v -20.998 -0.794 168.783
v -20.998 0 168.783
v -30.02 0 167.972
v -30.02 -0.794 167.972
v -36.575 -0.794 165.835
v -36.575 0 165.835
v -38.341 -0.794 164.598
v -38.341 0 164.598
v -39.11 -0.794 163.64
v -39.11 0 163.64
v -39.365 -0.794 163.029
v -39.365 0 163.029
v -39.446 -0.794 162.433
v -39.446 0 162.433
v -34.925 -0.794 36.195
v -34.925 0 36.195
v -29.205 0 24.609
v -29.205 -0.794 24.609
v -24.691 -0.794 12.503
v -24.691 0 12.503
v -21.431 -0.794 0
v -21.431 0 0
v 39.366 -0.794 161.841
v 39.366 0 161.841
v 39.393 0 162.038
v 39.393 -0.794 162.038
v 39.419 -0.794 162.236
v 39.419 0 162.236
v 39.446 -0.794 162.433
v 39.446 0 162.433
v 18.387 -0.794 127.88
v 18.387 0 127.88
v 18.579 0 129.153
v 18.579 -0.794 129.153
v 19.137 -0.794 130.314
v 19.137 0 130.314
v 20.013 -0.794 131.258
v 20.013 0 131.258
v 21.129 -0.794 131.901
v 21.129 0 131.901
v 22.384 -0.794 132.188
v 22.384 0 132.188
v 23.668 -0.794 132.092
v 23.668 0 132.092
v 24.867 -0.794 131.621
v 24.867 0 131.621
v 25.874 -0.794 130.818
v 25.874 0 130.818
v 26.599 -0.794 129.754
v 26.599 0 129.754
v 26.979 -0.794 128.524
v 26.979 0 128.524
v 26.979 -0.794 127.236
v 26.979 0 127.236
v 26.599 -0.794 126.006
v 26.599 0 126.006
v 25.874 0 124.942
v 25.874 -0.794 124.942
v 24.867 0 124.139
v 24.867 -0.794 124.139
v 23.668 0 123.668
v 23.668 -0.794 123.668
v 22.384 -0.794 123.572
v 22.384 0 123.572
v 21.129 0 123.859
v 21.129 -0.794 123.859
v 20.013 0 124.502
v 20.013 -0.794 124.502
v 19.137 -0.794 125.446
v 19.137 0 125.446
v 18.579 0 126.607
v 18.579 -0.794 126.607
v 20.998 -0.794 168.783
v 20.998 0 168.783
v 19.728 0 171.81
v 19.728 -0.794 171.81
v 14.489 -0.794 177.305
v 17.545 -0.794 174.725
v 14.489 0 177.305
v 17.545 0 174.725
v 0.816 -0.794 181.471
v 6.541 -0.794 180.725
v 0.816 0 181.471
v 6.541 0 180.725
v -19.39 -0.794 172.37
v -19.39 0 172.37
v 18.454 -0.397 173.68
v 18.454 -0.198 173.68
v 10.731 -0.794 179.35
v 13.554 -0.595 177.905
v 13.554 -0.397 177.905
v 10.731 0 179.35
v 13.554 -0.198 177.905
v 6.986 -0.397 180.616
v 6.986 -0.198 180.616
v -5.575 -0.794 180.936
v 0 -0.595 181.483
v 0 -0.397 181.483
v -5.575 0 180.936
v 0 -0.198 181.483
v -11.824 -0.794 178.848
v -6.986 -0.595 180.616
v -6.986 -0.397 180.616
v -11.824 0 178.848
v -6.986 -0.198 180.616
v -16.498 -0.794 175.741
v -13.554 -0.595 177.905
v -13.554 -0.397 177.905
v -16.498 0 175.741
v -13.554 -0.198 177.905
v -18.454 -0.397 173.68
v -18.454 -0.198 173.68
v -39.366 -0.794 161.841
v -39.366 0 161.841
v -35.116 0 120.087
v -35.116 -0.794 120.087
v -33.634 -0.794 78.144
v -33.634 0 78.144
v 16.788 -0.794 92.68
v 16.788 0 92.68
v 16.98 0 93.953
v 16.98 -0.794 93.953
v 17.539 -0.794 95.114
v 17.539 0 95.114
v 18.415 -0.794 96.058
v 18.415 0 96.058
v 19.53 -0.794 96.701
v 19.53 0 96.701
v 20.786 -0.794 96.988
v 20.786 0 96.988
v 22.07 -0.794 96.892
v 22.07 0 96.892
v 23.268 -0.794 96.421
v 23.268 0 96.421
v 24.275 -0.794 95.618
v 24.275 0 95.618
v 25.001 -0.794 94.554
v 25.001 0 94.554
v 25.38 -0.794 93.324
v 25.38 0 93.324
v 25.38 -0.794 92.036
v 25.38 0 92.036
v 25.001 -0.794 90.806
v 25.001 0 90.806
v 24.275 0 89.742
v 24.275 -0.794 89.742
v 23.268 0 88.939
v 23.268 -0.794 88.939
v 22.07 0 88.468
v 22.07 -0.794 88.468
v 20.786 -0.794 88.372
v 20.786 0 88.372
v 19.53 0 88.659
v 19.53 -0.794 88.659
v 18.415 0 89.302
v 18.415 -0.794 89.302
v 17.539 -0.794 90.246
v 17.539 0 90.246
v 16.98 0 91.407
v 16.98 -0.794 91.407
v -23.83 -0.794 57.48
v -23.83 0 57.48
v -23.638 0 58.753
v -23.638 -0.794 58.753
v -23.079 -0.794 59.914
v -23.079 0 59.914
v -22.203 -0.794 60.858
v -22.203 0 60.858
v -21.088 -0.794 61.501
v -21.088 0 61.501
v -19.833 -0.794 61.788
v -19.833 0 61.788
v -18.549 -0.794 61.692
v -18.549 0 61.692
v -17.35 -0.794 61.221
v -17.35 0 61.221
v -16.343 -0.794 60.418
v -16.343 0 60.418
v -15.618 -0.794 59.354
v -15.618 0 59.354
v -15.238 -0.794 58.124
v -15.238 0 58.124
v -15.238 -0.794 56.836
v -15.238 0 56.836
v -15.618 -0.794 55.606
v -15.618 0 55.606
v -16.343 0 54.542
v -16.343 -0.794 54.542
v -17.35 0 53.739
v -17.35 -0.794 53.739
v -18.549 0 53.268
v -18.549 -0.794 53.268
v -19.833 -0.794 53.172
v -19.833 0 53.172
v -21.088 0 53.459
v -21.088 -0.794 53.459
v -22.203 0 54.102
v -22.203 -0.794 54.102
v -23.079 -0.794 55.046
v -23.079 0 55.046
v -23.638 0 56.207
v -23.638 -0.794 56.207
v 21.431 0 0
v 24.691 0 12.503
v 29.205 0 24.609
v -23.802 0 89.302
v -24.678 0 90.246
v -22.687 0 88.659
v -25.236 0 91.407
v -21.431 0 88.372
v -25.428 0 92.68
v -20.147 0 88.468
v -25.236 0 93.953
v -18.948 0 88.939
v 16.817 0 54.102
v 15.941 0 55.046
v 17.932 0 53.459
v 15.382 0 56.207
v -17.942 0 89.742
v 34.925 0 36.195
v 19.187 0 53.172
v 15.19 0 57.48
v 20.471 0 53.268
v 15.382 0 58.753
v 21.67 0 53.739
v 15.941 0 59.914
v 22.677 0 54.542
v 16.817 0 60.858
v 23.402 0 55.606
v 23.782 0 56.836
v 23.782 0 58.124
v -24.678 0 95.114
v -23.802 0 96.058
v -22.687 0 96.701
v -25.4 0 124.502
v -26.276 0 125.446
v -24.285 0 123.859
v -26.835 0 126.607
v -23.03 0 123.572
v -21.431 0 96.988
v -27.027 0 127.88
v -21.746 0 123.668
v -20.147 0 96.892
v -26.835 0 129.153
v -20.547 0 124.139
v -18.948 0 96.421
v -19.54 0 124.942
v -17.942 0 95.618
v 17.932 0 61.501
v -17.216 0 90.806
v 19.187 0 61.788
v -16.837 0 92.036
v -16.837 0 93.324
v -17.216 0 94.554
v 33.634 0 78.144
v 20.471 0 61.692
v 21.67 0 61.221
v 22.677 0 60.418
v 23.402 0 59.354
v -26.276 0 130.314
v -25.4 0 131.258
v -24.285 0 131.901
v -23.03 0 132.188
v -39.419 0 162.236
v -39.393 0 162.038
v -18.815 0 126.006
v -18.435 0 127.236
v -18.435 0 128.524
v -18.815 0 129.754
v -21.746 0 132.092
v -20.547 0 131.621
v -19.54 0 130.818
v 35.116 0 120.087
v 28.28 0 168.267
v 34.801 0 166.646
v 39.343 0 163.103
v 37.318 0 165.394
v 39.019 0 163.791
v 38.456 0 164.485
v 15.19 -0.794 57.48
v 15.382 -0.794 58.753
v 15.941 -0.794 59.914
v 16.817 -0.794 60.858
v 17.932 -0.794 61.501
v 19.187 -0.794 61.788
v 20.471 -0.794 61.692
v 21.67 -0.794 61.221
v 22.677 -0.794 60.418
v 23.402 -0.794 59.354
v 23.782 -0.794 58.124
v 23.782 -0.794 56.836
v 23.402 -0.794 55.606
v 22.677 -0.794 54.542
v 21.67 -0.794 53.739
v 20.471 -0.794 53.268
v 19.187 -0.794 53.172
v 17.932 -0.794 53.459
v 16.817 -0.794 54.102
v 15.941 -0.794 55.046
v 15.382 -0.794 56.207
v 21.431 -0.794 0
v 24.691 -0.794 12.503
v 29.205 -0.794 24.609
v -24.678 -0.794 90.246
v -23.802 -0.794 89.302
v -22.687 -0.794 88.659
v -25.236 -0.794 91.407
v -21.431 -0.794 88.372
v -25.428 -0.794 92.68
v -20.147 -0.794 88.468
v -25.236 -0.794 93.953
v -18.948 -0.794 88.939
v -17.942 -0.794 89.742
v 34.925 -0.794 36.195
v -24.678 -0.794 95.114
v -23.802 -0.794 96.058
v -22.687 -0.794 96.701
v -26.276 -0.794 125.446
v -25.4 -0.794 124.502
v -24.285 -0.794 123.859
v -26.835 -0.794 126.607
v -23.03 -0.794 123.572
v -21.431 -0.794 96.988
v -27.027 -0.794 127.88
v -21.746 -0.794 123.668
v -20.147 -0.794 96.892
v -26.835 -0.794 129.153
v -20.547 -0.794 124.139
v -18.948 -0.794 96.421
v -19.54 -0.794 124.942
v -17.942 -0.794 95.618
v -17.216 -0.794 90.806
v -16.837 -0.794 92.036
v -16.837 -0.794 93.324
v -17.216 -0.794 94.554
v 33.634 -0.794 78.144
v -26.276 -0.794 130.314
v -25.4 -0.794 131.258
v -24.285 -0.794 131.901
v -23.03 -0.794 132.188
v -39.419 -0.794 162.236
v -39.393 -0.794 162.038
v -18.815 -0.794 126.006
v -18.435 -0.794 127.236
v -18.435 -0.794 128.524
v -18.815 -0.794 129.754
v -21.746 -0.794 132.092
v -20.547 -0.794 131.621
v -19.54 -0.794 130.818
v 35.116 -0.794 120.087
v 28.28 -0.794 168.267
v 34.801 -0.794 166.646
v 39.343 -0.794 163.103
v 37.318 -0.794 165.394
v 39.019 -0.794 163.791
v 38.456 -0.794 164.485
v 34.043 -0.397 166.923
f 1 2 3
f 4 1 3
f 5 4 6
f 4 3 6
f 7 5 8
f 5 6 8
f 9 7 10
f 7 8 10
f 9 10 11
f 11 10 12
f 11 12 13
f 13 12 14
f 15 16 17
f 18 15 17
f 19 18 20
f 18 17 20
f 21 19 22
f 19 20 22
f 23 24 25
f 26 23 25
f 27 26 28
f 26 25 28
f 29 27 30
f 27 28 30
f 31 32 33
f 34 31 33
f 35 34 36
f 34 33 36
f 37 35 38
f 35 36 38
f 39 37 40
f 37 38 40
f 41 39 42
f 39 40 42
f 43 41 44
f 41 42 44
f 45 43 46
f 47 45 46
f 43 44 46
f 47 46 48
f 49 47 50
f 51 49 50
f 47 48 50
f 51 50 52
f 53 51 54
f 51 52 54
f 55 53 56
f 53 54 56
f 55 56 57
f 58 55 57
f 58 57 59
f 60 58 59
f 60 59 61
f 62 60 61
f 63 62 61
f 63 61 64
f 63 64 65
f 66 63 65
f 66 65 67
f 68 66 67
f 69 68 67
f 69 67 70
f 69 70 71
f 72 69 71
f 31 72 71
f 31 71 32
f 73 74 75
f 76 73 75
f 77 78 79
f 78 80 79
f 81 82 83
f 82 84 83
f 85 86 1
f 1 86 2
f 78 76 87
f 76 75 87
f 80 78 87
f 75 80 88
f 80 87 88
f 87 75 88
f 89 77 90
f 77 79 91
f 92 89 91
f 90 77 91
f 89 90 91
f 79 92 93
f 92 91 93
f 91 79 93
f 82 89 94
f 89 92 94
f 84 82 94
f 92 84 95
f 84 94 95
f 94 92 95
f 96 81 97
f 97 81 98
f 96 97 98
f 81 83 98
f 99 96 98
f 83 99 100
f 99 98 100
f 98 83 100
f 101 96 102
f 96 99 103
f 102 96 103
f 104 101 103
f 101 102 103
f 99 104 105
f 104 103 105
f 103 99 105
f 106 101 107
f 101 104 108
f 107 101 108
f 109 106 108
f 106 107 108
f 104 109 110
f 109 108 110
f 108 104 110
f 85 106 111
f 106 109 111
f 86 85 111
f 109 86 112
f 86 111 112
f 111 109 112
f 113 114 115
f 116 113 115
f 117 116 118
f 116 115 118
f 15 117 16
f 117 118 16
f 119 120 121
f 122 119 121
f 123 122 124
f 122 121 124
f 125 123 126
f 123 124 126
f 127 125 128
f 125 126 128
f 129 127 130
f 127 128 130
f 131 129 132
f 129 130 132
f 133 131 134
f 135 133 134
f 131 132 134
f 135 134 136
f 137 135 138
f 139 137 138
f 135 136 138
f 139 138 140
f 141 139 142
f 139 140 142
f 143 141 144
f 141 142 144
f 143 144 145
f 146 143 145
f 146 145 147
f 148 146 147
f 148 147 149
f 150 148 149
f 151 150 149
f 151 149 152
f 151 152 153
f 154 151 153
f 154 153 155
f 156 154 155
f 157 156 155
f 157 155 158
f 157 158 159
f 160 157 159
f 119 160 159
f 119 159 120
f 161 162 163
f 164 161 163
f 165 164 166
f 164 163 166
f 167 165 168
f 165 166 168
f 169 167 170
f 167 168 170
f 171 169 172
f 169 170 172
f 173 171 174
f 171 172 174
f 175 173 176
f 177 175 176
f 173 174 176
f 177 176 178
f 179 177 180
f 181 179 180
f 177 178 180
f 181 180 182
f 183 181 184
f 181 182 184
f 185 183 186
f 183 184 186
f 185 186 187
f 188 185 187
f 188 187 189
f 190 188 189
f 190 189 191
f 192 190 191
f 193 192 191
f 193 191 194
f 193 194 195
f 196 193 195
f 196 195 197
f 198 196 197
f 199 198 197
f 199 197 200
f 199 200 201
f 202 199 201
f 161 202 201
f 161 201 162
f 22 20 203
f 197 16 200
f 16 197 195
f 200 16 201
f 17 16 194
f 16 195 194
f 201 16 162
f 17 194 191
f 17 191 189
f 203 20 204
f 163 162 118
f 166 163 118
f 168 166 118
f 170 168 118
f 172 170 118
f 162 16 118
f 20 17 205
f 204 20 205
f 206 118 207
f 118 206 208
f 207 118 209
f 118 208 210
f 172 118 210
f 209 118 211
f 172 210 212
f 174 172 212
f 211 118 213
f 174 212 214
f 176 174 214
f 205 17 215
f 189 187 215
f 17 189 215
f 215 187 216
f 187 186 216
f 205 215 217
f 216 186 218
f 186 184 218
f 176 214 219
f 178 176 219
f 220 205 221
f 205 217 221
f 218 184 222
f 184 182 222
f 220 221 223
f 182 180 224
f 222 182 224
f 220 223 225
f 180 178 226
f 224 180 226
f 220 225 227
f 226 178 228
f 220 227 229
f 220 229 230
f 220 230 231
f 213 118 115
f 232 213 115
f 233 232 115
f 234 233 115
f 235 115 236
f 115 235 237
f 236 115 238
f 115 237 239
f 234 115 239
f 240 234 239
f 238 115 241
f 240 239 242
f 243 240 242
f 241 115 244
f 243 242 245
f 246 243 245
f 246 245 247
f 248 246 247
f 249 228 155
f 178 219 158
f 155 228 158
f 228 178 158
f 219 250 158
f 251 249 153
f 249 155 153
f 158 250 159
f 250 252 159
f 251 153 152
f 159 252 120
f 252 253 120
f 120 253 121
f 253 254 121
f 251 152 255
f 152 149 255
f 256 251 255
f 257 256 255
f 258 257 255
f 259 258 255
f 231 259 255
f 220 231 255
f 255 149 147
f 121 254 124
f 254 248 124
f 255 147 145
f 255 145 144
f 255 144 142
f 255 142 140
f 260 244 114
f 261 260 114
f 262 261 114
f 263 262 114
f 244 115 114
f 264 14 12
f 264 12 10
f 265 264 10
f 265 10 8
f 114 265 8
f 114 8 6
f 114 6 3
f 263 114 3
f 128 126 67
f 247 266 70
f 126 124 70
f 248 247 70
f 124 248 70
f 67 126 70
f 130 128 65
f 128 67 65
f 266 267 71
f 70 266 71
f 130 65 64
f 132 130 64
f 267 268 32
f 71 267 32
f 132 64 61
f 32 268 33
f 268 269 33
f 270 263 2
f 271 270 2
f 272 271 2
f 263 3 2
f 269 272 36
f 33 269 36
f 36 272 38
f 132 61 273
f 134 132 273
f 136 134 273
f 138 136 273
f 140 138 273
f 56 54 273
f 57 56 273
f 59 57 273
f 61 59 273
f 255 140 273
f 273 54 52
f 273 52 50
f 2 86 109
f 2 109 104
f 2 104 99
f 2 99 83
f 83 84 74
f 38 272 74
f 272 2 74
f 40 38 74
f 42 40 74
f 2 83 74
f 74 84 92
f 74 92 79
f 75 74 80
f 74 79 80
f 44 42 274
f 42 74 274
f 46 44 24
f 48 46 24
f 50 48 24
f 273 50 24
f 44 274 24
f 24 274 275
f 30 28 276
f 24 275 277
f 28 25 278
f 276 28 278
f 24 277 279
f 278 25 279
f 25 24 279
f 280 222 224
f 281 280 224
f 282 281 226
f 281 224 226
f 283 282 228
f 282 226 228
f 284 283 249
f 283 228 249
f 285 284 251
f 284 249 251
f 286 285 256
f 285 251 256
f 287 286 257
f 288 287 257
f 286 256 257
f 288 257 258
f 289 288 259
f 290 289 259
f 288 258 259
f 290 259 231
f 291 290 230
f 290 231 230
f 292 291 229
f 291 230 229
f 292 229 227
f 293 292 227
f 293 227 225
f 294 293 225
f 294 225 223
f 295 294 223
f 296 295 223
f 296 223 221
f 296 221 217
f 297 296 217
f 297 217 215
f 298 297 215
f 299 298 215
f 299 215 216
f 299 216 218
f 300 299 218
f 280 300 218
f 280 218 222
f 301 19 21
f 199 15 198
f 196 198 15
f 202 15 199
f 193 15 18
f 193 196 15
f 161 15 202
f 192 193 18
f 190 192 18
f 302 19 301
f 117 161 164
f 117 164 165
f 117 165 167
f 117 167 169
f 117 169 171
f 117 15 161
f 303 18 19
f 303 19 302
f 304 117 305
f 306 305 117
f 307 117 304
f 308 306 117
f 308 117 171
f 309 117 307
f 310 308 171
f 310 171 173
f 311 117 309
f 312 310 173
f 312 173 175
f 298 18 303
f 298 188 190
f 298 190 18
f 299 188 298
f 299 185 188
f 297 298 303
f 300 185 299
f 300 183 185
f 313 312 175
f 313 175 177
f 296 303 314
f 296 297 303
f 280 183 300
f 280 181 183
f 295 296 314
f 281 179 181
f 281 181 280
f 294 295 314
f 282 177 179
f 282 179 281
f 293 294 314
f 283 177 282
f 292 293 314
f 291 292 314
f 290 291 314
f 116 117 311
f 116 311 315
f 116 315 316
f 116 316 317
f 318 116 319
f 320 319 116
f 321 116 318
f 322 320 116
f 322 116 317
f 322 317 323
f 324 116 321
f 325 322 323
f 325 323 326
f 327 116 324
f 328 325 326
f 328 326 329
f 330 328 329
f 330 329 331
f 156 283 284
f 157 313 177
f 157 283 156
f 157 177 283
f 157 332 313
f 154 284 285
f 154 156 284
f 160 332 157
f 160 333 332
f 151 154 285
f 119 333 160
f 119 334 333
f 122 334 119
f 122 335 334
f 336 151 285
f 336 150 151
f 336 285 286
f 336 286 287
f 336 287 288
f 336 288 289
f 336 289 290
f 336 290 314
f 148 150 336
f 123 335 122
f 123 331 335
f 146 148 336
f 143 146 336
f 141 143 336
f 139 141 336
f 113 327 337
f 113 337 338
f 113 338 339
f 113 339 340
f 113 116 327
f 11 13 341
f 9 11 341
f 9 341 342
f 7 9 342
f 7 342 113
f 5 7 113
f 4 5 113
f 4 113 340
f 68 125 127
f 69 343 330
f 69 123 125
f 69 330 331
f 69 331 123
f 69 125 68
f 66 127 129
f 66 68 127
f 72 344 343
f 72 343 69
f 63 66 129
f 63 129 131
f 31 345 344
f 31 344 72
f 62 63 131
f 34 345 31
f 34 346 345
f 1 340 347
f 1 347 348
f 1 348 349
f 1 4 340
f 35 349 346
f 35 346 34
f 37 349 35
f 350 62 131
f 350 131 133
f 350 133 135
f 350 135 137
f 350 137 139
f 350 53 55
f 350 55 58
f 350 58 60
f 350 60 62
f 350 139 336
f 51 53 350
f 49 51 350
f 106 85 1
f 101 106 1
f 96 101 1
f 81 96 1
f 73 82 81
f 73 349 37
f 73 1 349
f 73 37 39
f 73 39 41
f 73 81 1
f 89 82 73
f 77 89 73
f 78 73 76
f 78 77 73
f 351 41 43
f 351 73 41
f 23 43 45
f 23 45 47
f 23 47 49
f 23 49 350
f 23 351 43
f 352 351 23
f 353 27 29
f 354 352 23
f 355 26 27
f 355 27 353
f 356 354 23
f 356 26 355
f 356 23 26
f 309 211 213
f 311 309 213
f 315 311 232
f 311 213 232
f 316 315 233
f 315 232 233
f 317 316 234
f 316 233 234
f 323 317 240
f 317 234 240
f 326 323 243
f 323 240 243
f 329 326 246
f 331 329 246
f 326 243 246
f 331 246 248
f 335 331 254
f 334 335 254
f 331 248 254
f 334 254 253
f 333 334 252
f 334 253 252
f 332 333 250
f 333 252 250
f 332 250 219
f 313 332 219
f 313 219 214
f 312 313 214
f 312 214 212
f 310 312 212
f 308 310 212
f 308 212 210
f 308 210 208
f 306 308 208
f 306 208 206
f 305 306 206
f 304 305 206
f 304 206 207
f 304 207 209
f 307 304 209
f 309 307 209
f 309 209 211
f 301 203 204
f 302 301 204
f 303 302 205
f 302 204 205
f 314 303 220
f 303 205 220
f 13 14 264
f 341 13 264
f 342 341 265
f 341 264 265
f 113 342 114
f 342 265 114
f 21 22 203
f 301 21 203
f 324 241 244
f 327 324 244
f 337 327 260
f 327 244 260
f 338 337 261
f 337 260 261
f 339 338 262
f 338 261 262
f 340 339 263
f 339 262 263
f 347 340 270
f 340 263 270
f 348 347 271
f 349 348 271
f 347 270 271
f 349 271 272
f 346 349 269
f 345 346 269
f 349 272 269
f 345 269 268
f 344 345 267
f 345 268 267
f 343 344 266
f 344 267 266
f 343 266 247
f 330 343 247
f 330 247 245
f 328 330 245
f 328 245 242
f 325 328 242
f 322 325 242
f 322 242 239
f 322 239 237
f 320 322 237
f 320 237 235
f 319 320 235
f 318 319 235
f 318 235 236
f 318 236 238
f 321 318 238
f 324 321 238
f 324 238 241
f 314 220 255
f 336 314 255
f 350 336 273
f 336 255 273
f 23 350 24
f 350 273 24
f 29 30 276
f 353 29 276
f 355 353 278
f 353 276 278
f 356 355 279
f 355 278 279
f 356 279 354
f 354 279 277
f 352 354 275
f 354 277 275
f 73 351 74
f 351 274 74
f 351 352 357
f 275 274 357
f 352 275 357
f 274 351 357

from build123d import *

# Parameters (mm, degrees)
F1_DEPTH = 0.79375
F3_D     = 8.64
F3_DEPTH = 19.05
F3_TIP   = 2.5957178742


with BuildPart() as f1:
    # F0 (on Front) → F1 (new body)
    with BuildSketch(Plane.XZ):
        with BuildLine():
            ThreePointArc((-34.925, 36.195), (-26.7939350854, 18.6135357138), (-21.43125, 0))
            Line((-21.43125, 0), (21.43125, 0))
            ThreePointArc((21.43125, 0), (26.7939350854, 18.6135357138), (34.925, 36.195))
            ThreePointArc((34.925, 36.195), (34.0281457568, 99.1280352492), (39.3657787077, 161.840720949))
            add(Edge.make_bspline(
                [(17.2758395415, 156.2136128394), (37.4450433399, 154.7833469527), (39.3657787077, 161.840720949)],
                knots=[4.5092148971, 4.5092148971, 4.5092148971, 6.189777243, 6.189777243, 6.189777243], degree=2, weights=[1, 0.667253426, 1]))
            add(Edge.make_bspline(
                [(-17.2758395415, 156.2136128394), (0, 138.7818089253), (17.2758395415, 156.2136128394)],
                knots=[3.7748484695, 3.7748484695, 3.7748484695, 5.6499294912, 5.6499294912, 5.6499294912], degree=2, weights=[1, 0.5917724196, 1]))
            add(Edge.make_bspline(
                [(-39.3657787077, 161.840720949), (-37.4450433399, 154.7833469527), (-17.2758395415, 156.2136128394)],
                knots=[0.0934080642, 0.0934080642, 0.0934080642, 1.7739704101, 1.7739704101, 1.7739704101], degree=2, weights=[1, 0.667253426, 1]))
            ThreePointArc((-39.3657787077, 161.840720949), (-34.0281457568, 99.1280352492), (-34.925, 36.195))
        make_face()
        with BuildLine():
            ThreePointArc((-39.4462, 162.433), (-39.4059196661, 162.1368699369), (-39.3657787077, 161.840720949))
            add(Edge.make_bspline(
                [(-39.3657787077, 161.840720949), (-37.4450433399, 154.7833469527), (-17.2758395415, 156.2136128394)],
                knots=[0.0934080642, 0.0934080642, 0.0934080642, 1.7739704101, 1.7739704101, 1.7739704101], degree=2, weights=[1, 0.667253426, 1]))
            add(Edge.make_bspline(
                [(-20.99825082, 168.783), (-22.8985434862, 161.8870779347), (-17.2758395415, 156.2136128394)],
                knots=[2.9402347328, 2.9402347328, 2.9402347328, 3.7748484695, 3.7748484695, 3.7748484695], degree=2, weights=[1, 0.9141837803, 1]))
            add(Edge.make_bspline(
                [(-20.99825082, 168.783), (-39.4462, 168.783), (-39.4462, 162.433)],
                knots=[4.7123889804, 4.7123889804, 4.7123889804, 6.2831853072, 6.2831853072, 6.2831853072], degree=2, weights=[1, 0.7071067812, 1]))
        make_face()
        with BuildLine():
            add(Edge.make_bspline(
                [(-20.99825082, 168.783), (-22.8985434862, 161.8870779347), (-17.2758395415, 156.2136128394)],
                knots=[2.9402347328, 2.9402347328, 2.9402347328, 3.7748484695, 3.7748484695, 3.7748484695], degree=2, weights=[1, 0.9141837803, 1]))
            add(Edge.make_bspline(
                [(-17.2758395415, 156.2136128394), (-0.9555751765, 157.3709375219), (-2.6454105494, 163.076968761), (-4.3352459223, 168.783), (-20.99825082, 168.783)],
                knots=[1.7739704101, 1.7739704101, 1.7739704101, 3.2431796952, 3.2431796952, 4.7123889804, 4.7123889804, 4.7123889804], degree=2, weights=[1, 0.742095817, 1, 0.742095817, 1]))
        make_face()
        with BuildLine():
            add(Edge.make_bspline(
                [(-17.2758395415, 156.2136128394), (-0.9555751765, 157.3709375219), (-2.6454105494, 163.076968761), (-4.3352459223, 168.783), (-20.99825082, 168.783)],
                knots=[1.7739704101, 1.7739704101, 1.7739704101, 3.2431796952, 3.2431796952, 4.7123889804, 4.7123889804, 4.7123889804], degree=2, weights=[1, 0.742095817, 1, 0.742095817, 1]))
            add(Edge.make_bspline(
                [(-17.2758395415, 156.2136128394), (0, 138.7818089253), (17.2758395415, 156.2136128394)],
                knots=[3.7748484695, 3.7748484695, 3.7748484695, 5.6499294912, 5.6499294912, 5.6499294912], degree=2, weights=[1, 0.5917724196, 1]))
            add(Edge.make_bspline(
                [(20.99825082, 168.783), (4.3352459223, 168.783), (2.6454105494, 163.076968761), (0.9555751765, 157.3709375219), (17.2758395415, 156.2136128394)],
                knots=[1.5707963268, 1.5707963268, 1.5707963268, 3.0400056119, 3.0400056119, 4.5092148971, 4.5092148971, 4.5092148971], degree=2, weights=[1, 0.742095817, 1, 0.742095817, 1]))
            add(Edge.make_bspline(
                [(20.99825082, 168.783), (17.49854235, 181.483), (0, 181.483), (-17.49854235, 181.483), (-20.99825082, 168.783)],
                knots=[0.2013579208, 0.2013579208, 0.2013579208, 1.5707963268, 1.5707963268, 2.9402347328, 2.9402347328, 2.9402347328], degree=2, weights=[1, 0.7745966692, 1, 0.7745966692, 1]))
        make_face()
        with BuildLine():
            add(Edge.make_bspline(
                [(20.99825082, 168.783), (4.3352459223, 168.783), (2.6454105494, 163.076968761), (0.9555751765, 157.3709375219), (17.2758395415, 156.2136128394)],
                knots=[1.5707963268, 1.5707963268, 1.5707963268, 3.0400056119, 3.0400056119, 4.5092148971, 4.5092148971, 4.5092148971], degree=2, weights=[1, 0.742095817, 1, 0.742095817, 1]))
            add(Edge.make_bspline(
                [(17.2758395415, 156.2136128394), (21.43125, 160.4065378849), (21.43125, 165.608)],
                knots=[5.6499294912, 5.6499294912, 5.6499294912, 6.2831853072, 6.2831853072, 6.2831853072], degree=2, weights=[1, 0.9502907666, 1]))
            add(Edge.make_bspline(
                [(21.43125, 165.608), (21.43125, 167.2117006666), (20.99825082, 168.783)],
                knots=[0, 0, 0, 0.2013579208, 0.2013579208, 0.2013579208], degree=2, weights=[1, 0.994936153, 1]))
        make_face()
        with BuildLine():
            add(Edge.make_bspline(
                [(17.2758395415, 156.2136128394), (37.4450433399, 154.7833469527), (39.3657787077, 161.840720949)],
                knots=[4.5092148971, 4.5092148971, 4.5092148971, 6.189777243, 6.189777243, 6.189777243], degree=2, weights=[1, 0.667253426, 1]))
            ThreePointArc((39.3657787077, 161.840720949), (39.4059196661, 162.1368699369), (39.4462, 162.433))
            add(Edge.make_bspline(
                [(39.4462, 162.433), (39.4462, 168.783), (20.99825082, 168.783)],
                knots=[0, 0, 0, 1.5707963268, 1.5707963268, 1.5707963268], degree=2, weights=[1, 0.7071067812, 1]))
            add(Edge.make_bspline(
                [(21.43125, 165.608), (21.43125, 167.2117006666), (20.99825082, 168.783)],
                knots=[0, 0, 0, 0.2013579208, 0.2013579208, 0.2013579208], degree=2, weights=[1, 0.994936153, 1]))
            add(Edge.make_bspline(
                [(17.2758395415, 156.2136128394), (21.43125, 160.4065378849), (21.43125, 165.608)],
                knots=[5.6499294912, 5.6499294912, 5.6499294912, 6.2831853072, 6.2831853072, 6.2831853072], degree=2, weights=[1, 0.9502907666, 1]))
        make_face()
    extrude(amount=F1_DEPTH)

    # F3
    with Locations(Plane.XZ.offset(0.79375)):
        with Locations((-19.51, 57.48), (19.51, 57.48), (21.1084226467, 92.68), (-21.1084226467, 92.68), (-22.7068452934, 127.88), (22.7068452934, 127.88)):
            Hole(F3_D / 2, depth=F3_DEPTH)
            with Locations((0, 0, -(F3_DEPTH + F3_TIP / 2))):  # 118° drill point
                Cone(0, F3_D / 2, F3_TIP, mode=Mode.SUBTRACT)


solid = f1.part
